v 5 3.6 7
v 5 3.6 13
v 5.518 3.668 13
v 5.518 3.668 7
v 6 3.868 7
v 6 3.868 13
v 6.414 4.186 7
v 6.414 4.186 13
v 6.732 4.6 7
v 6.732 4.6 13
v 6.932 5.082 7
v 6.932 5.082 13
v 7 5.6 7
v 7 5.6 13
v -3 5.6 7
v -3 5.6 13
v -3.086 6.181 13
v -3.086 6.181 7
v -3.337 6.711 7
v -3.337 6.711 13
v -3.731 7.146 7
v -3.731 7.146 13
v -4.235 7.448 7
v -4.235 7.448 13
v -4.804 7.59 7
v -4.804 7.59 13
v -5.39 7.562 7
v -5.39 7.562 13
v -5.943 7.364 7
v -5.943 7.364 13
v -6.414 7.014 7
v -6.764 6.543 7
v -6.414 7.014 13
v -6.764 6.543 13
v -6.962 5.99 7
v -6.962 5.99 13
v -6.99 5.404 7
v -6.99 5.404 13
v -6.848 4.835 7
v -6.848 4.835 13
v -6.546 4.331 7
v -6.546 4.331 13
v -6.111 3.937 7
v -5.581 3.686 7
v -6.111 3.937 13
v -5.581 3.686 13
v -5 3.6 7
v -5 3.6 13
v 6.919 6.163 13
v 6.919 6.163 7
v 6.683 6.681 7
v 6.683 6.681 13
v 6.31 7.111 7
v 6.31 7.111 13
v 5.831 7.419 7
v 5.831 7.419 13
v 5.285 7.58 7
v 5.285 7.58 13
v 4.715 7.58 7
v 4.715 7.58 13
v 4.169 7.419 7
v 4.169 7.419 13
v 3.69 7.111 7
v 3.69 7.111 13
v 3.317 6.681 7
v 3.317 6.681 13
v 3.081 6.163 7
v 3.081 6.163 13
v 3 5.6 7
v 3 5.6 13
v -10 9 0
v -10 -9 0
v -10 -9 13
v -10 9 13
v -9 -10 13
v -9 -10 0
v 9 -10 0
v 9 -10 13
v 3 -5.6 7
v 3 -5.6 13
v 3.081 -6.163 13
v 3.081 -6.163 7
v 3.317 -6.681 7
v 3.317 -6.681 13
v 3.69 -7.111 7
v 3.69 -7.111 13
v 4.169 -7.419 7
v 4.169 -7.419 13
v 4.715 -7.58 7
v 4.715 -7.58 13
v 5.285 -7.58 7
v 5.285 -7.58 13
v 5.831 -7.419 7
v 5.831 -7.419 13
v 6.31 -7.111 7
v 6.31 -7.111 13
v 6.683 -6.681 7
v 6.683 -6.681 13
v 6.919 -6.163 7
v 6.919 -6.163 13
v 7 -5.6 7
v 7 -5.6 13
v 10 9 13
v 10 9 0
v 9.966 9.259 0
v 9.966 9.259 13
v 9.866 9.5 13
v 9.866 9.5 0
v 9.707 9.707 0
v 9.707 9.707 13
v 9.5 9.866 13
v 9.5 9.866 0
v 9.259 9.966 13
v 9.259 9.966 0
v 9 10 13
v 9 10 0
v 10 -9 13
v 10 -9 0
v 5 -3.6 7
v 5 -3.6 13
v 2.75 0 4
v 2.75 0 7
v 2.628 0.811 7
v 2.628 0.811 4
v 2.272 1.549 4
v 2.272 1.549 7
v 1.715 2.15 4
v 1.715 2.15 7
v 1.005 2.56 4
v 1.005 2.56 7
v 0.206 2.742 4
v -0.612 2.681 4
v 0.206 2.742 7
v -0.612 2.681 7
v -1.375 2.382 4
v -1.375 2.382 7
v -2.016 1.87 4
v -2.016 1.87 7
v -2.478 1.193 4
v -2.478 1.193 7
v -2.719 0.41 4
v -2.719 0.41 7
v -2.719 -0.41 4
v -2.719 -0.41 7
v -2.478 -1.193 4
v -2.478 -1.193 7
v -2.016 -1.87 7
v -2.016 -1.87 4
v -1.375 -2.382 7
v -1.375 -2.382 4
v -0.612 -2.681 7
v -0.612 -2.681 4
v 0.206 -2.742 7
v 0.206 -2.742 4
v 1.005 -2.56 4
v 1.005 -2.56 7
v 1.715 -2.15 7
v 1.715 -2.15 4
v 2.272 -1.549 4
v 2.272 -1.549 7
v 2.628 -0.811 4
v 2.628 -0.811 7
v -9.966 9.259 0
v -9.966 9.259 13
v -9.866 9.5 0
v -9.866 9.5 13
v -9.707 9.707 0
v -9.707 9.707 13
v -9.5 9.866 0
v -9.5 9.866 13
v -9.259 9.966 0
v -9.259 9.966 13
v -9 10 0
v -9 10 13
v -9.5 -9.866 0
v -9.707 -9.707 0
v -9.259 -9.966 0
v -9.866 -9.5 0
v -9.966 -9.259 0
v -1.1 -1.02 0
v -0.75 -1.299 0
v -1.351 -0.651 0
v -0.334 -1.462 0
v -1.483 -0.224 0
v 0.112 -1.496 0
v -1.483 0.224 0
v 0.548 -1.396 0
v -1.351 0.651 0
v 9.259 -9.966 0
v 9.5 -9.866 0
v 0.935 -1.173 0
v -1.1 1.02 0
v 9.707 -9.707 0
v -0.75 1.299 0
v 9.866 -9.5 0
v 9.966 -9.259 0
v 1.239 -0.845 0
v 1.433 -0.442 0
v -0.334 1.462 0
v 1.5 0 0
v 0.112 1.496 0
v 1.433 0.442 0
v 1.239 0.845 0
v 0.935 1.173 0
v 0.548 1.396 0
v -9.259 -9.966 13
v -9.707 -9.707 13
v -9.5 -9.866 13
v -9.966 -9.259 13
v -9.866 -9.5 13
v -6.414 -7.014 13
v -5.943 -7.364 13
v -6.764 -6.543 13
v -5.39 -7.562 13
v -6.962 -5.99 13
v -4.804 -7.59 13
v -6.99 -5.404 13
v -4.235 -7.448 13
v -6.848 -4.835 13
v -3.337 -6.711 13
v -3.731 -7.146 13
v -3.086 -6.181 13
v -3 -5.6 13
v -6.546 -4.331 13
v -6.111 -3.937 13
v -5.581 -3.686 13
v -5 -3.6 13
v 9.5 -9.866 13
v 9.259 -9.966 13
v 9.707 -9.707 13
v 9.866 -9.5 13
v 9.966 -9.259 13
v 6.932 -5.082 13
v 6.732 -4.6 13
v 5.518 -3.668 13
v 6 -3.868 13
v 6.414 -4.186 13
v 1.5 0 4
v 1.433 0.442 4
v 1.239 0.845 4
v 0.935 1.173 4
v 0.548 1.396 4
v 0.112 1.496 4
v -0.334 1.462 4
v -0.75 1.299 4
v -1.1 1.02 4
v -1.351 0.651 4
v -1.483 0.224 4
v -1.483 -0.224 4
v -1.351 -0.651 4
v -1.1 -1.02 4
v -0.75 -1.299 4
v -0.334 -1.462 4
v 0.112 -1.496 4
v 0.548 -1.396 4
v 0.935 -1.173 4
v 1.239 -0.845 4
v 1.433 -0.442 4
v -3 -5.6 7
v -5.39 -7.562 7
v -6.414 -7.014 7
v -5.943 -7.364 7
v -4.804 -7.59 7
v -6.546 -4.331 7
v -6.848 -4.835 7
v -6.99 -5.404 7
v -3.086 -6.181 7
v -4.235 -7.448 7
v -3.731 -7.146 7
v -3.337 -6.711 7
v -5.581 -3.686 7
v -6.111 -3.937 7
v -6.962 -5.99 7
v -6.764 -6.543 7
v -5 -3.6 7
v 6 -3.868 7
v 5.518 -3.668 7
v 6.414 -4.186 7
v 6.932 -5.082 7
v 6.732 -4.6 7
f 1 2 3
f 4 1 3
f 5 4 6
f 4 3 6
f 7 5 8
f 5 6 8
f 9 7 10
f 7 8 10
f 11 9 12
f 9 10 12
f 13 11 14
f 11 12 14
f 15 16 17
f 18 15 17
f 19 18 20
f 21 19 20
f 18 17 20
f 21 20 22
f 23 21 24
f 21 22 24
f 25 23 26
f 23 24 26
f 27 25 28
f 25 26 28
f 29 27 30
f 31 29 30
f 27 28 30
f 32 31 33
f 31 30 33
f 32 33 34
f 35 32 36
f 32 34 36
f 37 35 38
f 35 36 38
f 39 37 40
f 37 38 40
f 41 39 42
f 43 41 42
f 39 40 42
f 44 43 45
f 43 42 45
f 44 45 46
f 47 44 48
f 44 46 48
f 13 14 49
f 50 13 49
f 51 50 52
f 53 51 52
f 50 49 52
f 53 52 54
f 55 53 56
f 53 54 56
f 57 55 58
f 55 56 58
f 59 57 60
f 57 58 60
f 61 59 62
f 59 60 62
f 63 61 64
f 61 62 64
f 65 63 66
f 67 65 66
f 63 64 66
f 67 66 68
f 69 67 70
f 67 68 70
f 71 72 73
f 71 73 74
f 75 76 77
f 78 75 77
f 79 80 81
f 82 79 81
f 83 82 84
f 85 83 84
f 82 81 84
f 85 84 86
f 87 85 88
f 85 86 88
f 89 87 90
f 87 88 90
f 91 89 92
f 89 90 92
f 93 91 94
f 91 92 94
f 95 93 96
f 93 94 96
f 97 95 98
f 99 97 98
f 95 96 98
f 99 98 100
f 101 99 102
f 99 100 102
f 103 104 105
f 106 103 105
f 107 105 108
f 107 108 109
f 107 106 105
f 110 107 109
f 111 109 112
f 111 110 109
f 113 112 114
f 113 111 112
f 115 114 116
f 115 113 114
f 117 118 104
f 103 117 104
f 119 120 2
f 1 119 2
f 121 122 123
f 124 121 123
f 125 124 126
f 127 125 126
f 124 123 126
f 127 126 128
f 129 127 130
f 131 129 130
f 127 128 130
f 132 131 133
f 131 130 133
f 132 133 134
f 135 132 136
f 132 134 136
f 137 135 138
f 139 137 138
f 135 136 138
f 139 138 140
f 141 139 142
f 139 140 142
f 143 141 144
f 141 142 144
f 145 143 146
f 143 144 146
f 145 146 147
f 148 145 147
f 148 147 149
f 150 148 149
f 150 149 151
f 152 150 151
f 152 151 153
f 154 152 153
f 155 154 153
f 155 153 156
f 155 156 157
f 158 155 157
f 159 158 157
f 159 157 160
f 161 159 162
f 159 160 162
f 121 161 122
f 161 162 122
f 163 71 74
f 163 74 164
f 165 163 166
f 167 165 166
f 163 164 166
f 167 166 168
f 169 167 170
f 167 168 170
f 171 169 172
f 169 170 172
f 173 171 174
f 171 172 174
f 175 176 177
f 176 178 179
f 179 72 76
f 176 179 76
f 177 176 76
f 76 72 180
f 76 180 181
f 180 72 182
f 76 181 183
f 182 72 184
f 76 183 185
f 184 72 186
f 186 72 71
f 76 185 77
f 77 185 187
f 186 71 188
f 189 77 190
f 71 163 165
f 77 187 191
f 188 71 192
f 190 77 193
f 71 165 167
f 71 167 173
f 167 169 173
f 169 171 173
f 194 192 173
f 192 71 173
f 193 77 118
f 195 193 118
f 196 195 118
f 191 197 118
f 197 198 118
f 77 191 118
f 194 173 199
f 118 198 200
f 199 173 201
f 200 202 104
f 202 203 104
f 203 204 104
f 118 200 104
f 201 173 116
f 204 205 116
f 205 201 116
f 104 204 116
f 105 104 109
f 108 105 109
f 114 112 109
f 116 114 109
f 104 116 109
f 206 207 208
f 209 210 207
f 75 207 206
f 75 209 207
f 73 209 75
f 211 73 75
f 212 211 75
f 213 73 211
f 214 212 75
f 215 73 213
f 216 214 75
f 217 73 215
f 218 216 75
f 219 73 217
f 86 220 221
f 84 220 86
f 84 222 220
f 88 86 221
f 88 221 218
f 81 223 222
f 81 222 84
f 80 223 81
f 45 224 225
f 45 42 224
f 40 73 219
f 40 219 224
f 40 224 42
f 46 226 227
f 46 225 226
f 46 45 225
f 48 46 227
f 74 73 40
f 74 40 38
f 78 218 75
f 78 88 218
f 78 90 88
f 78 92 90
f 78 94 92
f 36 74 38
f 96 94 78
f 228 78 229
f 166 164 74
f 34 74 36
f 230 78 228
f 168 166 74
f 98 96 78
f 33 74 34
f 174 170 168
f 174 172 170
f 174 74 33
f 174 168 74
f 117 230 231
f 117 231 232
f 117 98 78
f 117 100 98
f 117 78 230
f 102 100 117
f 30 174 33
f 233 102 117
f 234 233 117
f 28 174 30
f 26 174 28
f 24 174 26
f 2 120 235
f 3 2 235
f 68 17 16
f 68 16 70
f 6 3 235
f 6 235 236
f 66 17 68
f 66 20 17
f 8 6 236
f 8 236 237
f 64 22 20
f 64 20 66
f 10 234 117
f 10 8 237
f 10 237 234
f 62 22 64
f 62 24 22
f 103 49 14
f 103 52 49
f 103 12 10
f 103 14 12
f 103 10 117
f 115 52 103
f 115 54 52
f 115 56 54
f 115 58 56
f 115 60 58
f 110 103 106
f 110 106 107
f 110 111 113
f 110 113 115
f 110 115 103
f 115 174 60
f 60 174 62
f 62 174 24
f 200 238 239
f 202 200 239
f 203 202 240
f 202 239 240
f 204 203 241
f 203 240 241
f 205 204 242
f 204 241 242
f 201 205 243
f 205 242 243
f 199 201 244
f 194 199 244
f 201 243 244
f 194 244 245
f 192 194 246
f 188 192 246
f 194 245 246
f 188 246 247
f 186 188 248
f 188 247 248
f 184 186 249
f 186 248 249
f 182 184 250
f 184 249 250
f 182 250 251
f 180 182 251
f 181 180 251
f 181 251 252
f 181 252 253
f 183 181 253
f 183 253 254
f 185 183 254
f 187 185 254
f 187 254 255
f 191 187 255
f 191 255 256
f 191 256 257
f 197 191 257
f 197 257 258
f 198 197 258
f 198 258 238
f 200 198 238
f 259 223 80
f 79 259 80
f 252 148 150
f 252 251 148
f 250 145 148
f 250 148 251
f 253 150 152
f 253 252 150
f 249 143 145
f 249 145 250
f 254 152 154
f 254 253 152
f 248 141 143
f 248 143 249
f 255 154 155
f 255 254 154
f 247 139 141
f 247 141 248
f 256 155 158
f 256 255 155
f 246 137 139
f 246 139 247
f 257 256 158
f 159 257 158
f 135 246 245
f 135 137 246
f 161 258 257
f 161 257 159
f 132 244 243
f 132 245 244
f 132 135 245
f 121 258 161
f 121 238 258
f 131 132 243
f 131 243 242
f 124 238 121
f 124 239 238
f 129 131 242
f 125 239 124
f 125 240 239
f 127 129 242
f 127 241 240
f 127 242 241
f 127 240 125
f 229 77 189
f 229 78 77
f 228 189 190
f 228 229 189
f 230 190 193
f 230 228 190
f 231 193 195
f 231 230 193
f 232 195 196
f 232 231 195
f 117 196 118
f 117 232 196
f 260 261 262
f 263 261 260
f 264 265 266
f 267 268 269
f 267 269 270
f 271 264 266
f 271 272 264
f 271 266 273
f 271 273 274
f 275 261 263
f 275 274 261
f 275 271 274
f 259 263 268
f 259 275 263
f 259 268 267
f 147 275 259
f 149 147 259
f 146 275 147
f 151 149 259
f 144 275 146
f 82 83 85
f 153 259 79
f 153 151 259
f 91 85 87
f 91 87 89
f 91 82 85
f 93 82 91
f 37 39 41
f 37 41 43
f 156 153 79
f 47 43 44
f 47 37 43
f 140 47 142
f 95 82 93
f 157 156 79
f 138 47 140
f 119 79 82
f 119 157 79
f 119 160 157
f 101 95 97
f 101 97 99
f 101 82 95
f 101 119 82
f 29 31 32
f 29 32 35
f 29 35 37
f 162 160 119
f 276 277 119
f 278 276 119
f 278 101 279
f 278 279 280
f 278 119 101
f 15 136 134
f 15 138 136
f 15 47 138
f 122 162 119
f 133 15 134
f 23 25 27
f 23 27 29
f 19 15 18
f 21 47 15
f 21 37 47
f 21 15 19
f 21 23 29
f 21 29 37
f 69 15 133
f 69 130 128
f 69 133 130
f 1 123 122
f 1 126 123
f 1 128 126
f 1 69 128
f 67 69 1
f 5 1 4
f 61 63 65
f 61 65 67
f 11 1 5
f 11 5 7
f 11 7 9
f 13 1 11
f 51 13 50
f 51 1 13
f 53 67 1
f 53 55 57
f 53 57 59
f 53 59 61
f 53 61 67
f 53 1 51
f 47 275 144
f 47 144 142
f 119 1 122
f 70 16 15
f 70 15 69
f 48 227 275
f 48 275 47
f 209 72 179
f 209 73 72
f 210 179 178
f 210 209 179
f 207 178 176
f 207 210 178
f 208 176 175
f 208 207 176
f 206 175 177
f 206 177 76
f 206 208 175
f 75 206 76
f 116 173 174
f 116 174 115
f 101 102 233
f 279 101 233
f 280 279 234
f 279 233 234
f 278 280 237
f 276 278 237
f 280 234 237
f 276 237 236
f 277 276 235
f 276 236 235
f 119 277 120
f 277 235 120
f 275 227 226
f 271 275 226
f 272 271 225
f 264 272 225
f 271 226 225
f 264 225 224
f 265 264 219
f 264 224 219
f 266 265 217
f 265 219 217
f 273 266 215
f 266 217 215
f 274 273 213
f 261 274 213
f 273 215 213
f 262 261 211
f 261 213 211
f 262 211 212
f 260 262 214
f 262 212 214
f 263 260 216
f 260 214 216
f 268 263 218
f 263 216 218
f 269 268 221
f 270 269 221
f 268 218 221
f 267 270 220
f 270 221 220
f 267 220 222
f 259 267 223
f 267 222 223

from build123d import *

# Parameters (mm, degrees)
F0_W      = 20
F0_H      = 20
F1_DEPTH  = 13
F2_R      = 1
F3_W      = 10
F3_H      = 11.2
F4_DEPTH  = 6
F5_R      = 2.75
F6_DEPTH  = 3
F8_DEPTH  = 6
F9_R      = 1.5
F10_DEPTH = 4.001


with BuildPart() as f1:
    # F0 (on Top) → F1 (new body)
    with BuildSketch(Plane.XY):
        Rectangle(F0_W, F0_H)
    extrude(amount=F1_DEPTH)

    # F2
    f2_edges = [f1.edges().sort_by_distance(p)[0] for p in [
        (10, -10, 6.5),
        (10, 10, 6.5),
        (-10, 10, 6.5),
        (-10, -10, 6.5),
    ]]
    fillet(f2_edges, radius=F2_R)

    # F3 (on face) → F4 (cut)
    with BuildSketch(Plane.XY.offset(13)):
        Rectangle(F3_W, F3_H)
    extrude(amount=-F4_DEPTH, mode=Mode.SUBTRACT)

    # F5 (on face) → F6 (cut)
    with BuildSketch(Plane.XY.offset(7)):
        Circle(F5_R)
    extrude(amount=-F6_DEPTH, mode=Mode.SUBTRACT)

    # F7 (on face) → F8 (cut)
    with BuildSketch(Plane.XY.offset(13)):
        with BuildLine():
            ThreePointArc((7, 5.6), (5, 7.6), (3, 5.6))
            Line((3, 5.6), (5, 5.6))
            Line((5, 5.6), (5, 3.6))
            ThreePointArc((5, 3.6), (6.4142135624, 4.1857864376), (7, 5.6))
        make_face()
        with BuildLine():
            Line((-5, -5.6), (-5, -3.6))
            ThreePointArc((-5, -3.6), (-6.4142135624, -7.0142135624), (-3, -5.6))
            Line((-3, -5.6), (-5, -5.6))
        make_face()
        with BuildLine():
            ThreePointArc((7, -5.6), (6.4142135624, -4.1857864376), (5, -3.6))
            Line((5, -3.6), (5, -5.6))
            Line((5, -5.6), (3, -5.6))
            ThreePointArc((3, -5.6), (5, -7.6), (7, -5.6))
        make_face()
        with BuildLine():
            Line((-5, 5.6), (-3, 5.6))
            ThreePointArc((-3, 5.6), (-6.4142135624, 7.0142135624), (-5, 3.6))
            Line((-5, 3.6), (-5, 5.6))
        make_face()
    extrude(amount=-F8_DEPTH, mode=Mode.SUBTRACT)

    # F9 (on face) → F10 (cut, through all)
    with BuildSketch(Plane.XY.offset(4)):
        Circle(F9_R)
    extrude(amount=-F10_DEPTH, mode=Mode.SUBTRACT)


solid = f1.part
